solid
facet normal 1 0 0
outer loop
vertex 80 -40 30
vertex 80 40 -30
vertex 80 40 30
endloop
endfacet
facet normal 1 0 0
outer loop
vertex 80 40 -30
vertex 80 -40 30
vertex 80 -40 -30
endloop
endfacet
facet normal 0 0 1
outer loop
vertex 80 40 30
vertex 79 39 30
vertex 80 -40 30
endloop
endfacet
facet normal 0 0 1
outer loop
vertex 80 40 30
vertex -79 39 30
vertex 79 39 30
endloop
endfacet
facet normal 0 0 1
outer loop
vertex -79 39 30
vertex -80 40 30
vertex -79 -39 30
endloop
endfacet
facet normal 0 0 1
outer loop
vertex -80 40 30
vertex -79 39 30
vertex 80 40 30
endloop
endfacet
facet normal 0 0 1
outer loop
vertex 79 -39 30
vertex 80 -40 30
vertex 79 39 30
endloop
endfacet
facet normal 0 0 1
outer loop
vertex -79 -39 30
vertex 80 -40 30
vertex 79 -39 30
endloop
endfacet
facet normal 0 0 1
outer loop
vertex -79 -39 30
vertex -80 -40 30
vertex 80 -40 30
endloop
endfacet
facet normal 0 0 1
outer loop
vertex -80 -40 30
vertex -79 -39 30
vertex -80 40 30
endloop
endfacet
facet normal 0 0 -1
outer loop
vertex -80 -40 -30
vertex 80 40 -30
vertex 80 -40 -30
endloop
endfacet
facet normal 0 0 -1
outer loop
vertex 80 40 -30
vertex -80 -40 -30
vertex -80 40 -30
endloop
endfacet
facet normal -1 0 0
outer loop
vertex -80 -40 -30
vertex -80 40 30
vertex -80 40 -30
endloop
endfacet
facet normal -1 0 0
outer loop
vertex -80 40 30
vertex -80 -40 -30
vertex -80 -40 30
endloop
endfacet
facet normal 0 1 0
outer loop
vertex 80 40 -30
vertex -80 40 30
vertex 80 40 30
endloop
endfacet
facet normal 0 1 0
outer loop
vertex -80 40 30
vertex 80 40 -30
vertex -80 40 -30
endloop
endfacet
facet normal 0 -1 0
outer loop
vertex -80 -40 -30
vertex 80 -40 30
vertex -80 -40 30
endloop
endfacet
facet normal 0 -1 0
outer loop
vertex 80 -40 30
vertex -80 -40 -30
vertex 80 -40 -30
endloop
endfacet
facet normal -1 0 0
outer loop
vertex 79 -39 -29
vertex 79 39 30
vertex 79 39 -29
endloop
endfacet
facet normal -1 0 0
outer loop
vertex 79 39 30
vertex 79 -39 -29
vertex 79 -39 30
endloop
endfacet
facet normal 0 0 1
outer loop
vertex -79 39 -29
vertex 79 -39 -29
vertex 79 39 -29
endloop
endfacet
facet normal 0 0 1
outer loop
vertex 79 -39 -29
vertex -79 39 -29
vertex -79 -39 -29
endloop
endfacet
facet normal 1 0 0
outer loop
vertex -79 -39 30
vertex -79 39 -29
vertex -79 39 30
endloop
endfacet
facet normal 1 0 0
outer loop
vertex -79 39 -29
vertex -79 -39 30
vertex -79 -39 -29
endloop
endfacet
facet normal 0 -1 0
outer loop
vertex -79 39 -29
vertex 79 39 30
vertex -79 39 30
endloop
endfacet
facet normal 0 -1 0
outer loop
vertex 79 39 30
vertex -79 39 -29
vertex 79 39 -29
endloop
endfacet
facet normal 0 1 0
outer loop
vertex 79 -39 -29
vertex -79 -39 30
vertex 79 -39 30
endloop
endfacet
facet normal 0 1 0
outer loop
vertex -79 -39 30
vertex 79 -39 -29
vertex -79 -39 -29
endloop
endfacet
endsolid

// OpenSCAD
// ========================================
// a 160 x 80 x 60 mm enclosure with 1 mm wall thickness
// NeuroCAD canonical IR; dimensions are millimetres
// ========================================
$fn = 48;

difference() {
  cube(size=[160, 80, 60], center=true);
  translate([0, 0, 0.6]) {
    cube(size=[158, 78, 59.2], center=true);
  }
}
